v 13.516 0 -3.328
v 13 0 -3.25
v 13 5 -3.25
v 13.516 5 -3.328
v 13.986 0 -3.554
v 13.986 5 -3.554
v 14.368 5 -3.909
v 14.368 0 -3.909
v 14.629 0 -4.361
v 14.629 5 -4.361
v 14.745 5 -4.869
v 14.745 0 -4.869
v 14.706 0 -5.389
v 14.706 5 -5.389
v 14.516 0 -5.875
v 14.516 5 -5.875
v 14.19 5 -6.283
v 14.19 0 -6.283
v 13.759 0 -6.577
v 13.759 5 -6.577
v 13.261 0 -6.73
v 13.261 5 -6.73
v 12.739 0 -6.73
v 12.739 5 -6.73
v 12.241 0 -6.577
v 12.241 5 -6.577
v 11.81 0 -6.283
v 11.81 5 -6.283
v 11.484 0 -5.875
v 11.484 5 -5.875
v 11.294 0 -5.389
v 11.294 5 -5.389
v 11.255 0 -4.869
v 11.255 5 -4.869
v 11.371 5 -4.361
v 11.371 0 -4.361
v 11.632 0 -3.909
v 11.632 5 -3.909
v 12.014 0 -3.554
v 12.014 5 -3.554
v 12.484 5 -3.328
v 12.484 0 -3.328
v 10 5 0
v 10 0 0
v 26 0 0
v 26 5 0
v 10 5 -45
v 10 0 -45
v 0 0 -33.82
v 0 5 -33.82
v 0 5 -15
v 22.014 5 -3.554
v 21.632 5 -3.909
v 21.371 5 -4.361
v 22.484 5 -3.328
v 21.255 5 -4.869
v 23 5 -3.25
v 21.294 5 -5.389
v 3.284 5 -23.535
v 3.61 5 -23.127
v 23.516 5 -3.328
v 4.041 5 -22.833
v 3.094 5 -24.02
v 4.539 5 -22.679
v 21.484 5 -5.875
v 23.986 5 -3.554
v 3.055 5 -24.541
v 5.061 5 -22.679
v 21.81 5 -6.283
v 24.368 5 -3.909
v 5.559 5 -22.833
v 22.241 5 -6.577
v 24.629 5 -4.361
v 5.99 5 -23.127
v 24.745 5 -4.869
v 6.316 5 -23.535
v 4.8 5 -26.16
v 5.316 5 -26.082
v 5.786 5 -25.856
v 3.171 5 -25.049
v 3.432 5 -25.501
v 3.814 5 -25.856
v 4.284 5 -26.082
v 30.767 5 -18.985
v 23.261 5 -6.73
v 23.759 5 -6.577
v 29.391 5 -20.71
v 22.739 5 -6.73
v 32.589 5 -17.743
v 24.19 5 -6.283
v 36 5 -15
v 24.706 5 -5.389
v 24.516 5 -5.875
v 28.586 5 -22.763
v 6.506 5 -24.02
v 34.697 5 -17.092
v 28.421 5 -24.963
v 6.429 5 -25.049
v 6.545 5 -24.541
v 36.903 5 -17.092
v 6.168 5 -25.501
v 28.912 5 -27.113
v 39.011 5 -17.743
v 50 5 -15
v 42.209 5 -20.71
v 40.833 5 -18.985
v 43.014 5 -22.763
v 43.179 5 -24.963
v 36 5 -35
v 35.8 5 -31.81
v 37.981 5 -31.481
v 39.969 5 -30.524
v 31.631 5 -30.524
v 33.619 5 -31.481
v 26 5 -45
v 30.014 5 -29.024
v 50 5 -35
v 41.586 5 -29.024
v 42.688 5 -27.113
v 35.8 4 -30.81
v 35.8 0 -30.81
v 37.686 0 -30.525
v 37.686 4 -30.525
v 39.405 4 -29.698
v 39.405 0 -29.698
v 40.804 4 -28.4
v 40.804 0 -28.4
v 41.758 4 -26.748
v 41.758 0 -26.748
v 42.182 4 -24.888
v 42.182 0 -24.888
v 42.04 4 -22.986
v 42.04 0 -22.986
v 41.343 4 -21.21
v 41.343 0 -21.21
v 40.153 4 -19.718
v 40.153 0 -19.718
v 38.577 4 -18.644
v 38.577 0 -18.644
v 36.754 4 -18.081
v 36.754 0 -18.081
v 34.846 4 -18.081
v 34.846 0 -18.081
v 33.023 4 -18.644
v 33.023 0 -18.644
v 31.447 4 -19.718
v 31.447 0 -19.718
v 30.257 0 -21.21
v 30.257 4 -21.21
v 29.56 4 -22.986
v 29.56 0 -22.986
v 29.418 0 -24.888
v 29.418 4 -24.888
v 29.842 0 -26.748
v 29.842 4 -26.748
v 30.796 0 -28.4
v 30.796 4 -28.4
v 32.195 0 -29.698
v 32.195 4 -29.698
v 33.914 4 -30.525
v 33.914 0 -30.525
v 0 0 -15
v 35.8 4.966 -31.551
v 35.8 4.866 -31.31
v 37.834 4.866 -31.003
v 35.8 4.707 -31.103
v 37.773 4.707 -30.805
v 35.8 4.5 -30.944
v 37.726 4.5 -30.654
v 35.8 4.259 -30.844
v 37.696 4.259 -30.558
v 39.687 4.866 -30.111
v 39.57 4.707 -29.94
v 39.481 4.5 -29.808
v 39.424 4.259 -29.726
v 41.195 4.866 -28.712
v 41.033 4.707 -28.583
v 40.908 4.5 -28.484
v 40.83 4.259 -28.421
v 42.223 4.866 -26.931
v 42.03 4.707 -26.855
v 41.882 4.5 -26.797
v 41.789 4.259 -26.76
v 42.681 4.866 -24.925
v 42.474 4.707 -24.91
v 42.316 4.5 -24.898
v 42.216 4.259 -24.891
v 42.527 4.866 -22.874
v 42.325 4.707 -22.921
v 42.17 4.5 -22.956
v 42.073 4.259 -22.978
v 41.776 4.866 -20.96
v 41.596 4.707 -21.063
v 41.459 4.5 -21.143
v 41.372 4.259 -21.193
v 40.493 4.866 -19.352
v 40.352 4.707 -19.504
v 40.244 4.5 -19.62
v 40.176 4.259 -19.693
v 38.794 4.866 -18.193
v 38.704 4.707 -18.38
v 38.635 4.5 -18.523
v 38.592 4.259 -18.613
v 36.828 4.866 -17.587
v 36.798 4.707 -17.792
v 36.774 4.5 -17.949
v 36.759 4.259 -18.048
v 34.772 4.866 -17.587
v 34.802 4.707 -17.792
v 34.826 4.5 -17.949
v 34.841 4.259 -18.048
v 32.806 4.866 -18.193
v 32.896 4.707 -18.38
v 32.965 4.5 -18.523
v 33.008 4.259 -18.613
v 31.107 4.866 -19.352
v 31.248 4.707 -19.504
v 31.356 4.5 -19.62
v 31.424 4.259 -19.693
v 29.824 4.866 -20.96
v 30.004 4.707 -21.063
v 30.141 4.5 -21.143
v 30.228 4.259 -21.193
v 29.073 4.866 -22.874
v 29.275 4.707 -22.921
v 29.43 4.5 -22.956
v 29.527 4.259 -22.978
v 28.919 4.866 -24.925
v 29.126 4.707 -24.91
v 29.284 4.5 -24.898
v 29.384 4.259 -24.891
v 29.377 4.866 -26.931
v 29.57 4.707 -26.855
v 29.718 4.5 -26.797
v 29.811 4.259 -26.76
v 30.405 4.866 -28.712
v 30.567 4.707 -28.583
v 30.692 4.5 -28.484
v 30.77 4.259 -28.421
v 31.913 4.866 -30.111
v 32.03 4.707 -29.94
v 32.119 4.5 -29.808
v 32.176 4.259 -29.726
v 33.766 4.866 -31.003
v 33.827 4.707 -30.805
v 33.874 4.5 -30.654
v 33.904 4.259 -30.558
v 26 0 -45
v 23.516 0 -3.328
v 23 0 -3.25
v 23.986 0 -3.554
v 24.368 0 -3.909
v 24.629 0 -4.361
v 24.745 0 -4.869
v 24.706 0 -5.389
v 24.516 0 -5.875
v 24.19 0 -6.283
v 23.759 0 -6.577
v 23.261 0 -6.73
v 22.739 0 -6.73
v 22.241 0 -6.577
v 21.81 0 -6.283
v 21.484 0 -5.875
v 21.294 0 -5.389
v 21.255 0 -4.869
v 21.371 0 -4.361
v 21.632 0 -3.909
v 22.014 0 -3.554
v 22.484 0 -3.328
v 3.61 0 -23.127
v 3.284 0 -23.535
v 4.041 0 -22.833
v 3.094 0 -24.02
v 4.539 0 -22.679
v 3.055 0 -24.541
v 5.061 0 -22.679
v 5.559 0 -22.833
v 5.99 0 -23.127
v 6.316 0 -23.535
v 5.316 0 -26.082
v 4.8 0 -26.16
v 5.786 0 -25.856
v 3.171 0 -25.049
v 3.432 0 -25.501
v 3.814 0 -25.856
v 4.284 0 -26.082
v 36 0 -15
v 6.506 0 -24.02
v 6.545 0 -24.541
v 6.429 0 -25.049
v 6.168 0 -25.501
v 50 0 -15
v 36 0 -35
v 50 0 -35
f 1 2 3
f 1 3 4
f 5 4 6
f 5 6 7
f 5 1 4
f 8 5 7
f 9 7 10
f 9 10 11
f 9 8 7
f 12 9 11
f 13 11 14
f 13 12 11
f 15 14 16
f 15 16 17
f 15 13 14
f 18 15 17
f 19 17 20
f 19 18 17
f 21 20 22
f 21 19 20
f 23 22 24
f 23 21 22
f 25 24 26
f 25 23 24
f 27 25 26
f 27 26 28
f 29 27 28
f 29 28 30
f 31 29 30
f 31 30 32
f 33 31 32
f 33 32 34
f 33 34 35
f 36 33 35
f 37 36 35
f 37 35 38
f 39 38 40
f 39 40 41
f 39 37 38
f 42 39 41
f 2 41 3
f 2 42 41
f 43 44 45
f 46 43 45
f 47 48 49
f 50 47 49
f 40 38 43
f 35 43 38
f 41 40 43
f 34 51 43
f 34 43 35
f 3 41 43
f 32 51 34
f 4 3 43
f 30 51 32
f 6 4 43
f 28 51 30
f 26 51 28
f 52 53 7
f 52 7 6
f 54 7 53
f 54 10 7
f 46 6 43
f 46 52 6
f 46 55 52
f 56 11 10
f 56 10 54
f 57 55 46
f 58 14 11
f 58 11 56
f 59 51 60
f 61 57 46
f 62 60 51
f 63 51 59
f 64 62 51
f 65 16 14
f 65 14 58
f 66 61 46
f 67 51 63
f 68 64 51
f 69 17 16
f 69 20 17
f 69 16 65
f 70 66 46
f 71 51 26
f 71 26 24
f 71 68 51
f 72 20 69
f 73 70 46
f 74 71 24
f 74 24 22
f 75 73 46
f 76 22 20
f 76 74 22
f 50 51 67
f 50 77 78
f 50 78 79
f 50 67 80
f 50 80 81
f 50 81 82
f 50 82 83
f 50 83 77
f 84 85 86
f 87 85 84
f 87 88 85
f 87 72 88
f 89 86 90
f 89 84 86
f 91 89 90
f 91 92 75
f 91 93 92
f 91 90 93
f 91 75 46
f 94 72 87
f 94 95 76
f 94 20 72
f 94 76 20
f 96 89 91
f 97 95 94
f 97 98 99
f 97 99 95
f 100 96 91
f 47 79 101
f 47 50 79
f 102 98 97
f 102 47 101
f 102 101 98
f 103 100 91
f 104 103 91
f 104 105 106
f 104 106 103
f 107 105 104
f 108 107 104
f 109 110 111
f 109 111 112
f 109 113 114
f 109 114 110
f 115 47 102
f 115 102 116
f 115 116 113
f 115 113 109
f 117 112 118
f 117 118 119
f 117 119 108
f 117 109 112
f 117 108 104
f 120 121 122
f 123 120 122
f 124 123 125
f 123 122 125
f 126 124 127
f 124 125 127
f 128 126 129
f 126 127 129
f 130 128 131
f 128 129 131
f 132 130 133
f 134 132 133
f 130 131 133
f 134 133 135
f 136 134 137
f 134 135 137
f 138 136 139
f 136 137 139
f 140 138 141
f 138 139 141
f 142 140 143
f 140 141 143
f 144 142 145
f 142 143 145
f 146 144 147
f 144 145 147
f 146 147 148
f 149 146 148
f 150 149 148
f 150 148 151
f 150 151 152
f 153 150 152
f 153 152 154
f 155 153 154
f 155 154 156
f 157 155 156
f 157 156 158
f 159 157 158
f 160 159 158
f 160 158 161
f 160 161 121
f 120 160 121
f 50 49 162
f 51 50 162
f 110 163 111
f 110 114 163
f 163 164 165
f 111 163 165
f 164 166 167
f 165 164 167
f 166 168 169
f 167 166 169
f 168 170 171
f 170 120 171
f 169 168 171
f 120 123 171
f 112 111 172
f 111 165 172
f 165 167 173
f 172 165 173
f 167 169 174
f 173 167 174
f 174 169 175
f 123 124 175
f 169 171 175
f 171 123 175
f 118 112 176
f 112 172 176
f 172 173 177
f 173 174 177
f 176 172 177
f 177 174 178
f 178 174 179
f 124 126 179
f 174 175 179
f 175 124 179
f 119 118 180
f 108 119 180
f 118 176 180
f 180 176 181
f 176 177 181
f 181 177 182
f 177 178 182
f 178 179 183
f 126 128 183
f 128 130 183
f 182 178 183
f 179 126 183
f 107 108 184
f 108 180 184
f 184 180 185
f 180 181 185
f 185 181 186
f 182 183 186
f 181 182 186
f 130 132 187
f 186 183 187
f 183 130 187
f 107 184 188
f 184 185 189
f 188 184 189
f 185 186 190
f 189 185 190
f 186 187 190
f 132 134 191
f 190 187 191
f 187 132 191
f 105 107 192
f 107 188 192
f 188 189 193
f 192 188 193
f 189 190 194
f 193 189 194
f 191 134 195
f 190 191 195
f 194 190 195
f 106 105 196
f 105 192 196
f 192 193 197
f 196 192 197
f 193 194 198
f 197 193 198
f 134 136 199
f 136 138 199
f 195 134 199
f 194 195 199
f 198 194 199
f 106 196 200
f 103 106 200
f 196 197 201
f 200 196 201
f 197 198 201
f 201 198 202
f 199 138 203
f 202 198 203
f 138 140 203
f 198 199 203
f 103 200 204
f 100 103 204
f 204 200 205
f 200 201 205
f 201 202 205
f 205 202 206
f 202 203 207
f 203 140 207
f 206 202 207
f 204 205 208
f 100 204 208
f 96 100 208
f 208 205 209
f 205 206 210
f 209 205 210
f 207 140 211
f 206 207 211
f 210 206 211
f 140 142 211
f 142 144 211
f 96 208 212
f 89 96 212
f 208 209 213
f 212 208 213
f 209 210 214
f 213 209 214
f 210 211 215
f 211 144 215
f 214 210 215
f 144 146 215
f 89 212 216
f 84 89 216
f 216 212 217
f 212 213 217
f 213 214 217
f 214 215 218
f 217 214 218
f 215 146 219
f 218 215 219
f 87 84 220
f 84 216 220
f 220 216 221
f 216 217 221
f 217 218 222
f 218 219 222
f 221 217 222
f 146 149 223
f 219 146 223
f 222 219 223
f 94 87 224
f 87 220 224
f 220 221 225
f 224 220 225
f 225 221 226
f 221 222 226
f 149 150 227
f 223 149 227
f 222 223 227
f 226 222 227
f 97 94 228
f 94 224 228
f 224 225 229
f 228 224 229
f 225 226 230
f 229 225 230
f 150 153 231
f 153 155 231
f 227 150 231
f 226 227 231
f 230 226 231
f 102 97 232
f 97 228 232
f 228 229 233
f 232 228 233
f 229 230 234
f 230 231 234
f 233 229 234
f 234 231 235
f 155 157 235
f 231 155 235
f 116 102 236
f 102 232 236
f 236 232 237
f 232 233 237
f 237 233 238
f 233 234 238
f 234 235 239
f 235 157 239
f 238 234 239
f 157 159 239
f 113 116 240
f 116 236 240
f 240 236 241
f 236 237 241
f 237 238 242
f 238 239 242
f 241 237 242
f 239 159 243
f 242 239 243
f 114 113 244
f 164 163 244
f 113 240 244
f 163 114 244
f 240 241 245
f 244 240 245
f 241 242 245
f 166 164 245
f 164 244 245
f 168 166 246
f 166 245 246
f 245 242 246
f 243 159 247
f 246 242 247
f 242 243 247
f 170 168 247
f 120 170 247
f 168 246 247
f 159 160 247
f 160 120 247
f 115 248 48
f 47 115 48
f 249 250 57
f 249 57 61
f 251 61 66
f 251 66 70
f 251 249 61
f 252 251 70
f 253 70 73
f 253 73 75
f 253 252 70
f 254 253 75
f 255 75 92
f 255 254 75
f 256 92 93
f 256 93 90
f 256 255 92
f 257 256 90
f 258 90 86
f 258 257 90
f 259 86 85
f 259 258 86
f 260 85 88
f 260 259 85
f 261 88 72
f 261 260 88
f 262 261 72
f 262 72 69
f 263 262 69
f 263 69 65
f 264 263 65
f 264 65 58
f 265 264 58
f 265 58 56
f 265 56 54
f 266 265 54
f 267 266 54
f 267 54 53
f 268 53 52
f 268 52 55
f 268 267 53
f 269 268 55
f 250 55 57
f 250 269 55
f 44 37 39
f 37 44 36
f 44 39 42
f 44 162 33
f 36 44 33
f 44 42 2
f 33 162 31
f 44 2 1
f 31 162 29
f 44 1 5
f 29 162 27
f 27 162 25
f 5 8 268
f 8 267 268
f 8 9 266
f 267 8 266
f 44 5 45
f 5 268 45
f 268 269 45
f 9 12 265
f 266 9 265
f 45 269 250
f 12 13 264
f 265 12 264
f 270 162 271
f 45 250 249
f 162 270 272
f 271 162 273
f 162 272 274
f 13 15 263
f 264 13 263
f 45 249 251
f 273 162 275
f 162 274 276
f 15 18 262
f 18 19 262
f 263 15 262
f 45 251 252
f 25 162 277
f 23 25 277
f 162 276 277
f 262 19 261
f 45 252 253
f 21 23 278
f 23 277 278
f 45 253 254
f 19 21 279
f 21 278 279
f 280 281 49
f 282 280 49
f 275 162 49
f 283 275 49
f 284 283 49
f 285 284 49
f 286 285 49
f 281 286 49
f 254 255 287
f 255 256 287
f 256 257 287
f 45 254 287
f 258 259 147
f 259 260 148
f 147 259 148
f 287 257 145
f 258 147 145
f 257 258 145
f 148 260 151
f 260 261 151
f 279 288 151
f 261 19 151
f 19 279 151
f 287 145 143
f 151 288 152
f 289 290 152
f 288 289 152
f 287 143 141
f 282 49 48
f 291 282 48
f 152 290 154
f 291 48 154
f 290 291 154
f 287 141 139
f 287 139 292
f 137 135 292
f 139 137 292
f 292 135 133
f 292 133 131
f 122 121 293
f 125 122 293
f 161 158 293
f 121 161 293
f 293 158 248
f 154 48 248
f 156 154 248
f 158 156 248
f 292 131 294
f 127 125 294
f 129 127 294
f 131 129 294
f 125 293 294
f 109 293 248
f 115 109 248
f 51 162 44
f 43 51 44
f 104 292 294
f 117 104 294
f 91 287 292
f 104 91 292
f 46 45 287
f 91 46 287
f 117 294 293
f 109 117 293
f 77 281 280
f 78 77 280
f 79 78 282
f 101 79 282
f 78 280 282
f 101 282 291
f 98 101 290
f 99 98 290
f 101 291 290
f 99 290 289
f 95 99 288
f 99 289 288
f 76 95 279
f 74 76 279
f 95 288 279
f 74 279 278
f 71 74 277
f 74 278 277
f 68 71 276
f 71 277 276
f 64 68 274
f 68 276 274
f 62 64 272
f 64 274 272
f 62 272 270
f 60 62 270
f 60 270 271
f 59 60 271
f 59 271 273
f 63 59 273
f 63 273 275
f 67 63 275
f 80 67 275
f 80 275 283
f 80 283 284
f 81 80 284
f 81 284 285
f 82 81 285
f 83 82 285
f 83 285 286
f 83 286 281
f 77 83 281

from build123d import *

# Parameters (mm, degrees)
SKETCH1_R           = 1.75
BOSS_EXTRUDE1_DEPTH = 5
SKETCH2_R           = 1.75
SKETCH2_R_2         = 6.4
CUT_EXTRUDE1_DEPTH  = 10
FILLET1_R           = 1


with BuildPart() as part:
    # Sketch1 → Boss-Extrude1 (new body)
    # profile 1 of 4: a face of its own
    with BuildSketch(Plane(origin=(0, 0, 0), x_dir=(1, 0, 0), z_dir=(0, 1, 0))):
        Polygon((50, 25), (0, 25), (0, 15), (10, 0), (26, 0), (36, 15), (50, 15), align=None)
        with Locations(Location((13, 5, 0), (0, 0, 270))):
            Circle(SKETCH1_R, mode=Mode.SUBTRACT)
        with Locations(Location((23, 5, 0), (0, 0, 270))):
            Circle(SKETCH1_R, mode=Mode.SUBTRACT)
    # profile 2 of 4: a face of its own
    with BuildSketch(Plane(origin=(0, 0, 0), x_dir=(1, 0, 0), z_dir=(0, 1, 0))):
        Polygon((10, 45), (0, 33.819660113), (0, 25), (50, 25), (50, 35), (36, 35), (26, 45), align=None)
    # profile 3 of 4: a face of its own
    with BuildSketch(Plane(origin=(0, 0, 0), x_dir=(1, 0, 0), z_dir=(0, 1, 0))):
        Polygon((10, 45), (0, 33.819660113), (0, 25), (50, 25), (50, 35), (36, 35), (26, 45), align=None)
    # profile 4 of 4: a face of its own
    with BuildSketch(Plane(origin=(0, 0, 0), x_dir=(1, 0, 0), z_dir=(0, 1, 0))):
        Polygon((10, 45), (0, 33.819660113), (0, 25), (50, 25), (50, 35), (36, 35), (26, 45), align=None)
    extrude(amount=BOSS_EXTRUDE1_DEPTH)

    # Sketch2 → Cut-Extrude1 (cut)
    with BuildSketch(Plane(origin=(0, 0, 0), x_dir=(-1, 0, 0), z_dir=(0, -1, 0))):
        with Locations(Location((-4.8, 24.409830056, 0), (0, 0, 90))):
            Circle(SKETCH2_R)
        with Locations(Location((-35.8, 24.409830056, 0), (0, 0, 90))):
            Circle(SKETCH2_R_2)
    extrude(amount=-CUT_EXTRUDE1_DEPTH, mode=Mode.SUBTRACT)

    # Fillet1
    fillet1_edges = [part.edges().sort_by_distance(p)[0] for p in [
        (35.8, 5, -18.009830056),
    ]]
    fillet(fillet1_edges, radius=FILLET1_R)


solid = part.part
